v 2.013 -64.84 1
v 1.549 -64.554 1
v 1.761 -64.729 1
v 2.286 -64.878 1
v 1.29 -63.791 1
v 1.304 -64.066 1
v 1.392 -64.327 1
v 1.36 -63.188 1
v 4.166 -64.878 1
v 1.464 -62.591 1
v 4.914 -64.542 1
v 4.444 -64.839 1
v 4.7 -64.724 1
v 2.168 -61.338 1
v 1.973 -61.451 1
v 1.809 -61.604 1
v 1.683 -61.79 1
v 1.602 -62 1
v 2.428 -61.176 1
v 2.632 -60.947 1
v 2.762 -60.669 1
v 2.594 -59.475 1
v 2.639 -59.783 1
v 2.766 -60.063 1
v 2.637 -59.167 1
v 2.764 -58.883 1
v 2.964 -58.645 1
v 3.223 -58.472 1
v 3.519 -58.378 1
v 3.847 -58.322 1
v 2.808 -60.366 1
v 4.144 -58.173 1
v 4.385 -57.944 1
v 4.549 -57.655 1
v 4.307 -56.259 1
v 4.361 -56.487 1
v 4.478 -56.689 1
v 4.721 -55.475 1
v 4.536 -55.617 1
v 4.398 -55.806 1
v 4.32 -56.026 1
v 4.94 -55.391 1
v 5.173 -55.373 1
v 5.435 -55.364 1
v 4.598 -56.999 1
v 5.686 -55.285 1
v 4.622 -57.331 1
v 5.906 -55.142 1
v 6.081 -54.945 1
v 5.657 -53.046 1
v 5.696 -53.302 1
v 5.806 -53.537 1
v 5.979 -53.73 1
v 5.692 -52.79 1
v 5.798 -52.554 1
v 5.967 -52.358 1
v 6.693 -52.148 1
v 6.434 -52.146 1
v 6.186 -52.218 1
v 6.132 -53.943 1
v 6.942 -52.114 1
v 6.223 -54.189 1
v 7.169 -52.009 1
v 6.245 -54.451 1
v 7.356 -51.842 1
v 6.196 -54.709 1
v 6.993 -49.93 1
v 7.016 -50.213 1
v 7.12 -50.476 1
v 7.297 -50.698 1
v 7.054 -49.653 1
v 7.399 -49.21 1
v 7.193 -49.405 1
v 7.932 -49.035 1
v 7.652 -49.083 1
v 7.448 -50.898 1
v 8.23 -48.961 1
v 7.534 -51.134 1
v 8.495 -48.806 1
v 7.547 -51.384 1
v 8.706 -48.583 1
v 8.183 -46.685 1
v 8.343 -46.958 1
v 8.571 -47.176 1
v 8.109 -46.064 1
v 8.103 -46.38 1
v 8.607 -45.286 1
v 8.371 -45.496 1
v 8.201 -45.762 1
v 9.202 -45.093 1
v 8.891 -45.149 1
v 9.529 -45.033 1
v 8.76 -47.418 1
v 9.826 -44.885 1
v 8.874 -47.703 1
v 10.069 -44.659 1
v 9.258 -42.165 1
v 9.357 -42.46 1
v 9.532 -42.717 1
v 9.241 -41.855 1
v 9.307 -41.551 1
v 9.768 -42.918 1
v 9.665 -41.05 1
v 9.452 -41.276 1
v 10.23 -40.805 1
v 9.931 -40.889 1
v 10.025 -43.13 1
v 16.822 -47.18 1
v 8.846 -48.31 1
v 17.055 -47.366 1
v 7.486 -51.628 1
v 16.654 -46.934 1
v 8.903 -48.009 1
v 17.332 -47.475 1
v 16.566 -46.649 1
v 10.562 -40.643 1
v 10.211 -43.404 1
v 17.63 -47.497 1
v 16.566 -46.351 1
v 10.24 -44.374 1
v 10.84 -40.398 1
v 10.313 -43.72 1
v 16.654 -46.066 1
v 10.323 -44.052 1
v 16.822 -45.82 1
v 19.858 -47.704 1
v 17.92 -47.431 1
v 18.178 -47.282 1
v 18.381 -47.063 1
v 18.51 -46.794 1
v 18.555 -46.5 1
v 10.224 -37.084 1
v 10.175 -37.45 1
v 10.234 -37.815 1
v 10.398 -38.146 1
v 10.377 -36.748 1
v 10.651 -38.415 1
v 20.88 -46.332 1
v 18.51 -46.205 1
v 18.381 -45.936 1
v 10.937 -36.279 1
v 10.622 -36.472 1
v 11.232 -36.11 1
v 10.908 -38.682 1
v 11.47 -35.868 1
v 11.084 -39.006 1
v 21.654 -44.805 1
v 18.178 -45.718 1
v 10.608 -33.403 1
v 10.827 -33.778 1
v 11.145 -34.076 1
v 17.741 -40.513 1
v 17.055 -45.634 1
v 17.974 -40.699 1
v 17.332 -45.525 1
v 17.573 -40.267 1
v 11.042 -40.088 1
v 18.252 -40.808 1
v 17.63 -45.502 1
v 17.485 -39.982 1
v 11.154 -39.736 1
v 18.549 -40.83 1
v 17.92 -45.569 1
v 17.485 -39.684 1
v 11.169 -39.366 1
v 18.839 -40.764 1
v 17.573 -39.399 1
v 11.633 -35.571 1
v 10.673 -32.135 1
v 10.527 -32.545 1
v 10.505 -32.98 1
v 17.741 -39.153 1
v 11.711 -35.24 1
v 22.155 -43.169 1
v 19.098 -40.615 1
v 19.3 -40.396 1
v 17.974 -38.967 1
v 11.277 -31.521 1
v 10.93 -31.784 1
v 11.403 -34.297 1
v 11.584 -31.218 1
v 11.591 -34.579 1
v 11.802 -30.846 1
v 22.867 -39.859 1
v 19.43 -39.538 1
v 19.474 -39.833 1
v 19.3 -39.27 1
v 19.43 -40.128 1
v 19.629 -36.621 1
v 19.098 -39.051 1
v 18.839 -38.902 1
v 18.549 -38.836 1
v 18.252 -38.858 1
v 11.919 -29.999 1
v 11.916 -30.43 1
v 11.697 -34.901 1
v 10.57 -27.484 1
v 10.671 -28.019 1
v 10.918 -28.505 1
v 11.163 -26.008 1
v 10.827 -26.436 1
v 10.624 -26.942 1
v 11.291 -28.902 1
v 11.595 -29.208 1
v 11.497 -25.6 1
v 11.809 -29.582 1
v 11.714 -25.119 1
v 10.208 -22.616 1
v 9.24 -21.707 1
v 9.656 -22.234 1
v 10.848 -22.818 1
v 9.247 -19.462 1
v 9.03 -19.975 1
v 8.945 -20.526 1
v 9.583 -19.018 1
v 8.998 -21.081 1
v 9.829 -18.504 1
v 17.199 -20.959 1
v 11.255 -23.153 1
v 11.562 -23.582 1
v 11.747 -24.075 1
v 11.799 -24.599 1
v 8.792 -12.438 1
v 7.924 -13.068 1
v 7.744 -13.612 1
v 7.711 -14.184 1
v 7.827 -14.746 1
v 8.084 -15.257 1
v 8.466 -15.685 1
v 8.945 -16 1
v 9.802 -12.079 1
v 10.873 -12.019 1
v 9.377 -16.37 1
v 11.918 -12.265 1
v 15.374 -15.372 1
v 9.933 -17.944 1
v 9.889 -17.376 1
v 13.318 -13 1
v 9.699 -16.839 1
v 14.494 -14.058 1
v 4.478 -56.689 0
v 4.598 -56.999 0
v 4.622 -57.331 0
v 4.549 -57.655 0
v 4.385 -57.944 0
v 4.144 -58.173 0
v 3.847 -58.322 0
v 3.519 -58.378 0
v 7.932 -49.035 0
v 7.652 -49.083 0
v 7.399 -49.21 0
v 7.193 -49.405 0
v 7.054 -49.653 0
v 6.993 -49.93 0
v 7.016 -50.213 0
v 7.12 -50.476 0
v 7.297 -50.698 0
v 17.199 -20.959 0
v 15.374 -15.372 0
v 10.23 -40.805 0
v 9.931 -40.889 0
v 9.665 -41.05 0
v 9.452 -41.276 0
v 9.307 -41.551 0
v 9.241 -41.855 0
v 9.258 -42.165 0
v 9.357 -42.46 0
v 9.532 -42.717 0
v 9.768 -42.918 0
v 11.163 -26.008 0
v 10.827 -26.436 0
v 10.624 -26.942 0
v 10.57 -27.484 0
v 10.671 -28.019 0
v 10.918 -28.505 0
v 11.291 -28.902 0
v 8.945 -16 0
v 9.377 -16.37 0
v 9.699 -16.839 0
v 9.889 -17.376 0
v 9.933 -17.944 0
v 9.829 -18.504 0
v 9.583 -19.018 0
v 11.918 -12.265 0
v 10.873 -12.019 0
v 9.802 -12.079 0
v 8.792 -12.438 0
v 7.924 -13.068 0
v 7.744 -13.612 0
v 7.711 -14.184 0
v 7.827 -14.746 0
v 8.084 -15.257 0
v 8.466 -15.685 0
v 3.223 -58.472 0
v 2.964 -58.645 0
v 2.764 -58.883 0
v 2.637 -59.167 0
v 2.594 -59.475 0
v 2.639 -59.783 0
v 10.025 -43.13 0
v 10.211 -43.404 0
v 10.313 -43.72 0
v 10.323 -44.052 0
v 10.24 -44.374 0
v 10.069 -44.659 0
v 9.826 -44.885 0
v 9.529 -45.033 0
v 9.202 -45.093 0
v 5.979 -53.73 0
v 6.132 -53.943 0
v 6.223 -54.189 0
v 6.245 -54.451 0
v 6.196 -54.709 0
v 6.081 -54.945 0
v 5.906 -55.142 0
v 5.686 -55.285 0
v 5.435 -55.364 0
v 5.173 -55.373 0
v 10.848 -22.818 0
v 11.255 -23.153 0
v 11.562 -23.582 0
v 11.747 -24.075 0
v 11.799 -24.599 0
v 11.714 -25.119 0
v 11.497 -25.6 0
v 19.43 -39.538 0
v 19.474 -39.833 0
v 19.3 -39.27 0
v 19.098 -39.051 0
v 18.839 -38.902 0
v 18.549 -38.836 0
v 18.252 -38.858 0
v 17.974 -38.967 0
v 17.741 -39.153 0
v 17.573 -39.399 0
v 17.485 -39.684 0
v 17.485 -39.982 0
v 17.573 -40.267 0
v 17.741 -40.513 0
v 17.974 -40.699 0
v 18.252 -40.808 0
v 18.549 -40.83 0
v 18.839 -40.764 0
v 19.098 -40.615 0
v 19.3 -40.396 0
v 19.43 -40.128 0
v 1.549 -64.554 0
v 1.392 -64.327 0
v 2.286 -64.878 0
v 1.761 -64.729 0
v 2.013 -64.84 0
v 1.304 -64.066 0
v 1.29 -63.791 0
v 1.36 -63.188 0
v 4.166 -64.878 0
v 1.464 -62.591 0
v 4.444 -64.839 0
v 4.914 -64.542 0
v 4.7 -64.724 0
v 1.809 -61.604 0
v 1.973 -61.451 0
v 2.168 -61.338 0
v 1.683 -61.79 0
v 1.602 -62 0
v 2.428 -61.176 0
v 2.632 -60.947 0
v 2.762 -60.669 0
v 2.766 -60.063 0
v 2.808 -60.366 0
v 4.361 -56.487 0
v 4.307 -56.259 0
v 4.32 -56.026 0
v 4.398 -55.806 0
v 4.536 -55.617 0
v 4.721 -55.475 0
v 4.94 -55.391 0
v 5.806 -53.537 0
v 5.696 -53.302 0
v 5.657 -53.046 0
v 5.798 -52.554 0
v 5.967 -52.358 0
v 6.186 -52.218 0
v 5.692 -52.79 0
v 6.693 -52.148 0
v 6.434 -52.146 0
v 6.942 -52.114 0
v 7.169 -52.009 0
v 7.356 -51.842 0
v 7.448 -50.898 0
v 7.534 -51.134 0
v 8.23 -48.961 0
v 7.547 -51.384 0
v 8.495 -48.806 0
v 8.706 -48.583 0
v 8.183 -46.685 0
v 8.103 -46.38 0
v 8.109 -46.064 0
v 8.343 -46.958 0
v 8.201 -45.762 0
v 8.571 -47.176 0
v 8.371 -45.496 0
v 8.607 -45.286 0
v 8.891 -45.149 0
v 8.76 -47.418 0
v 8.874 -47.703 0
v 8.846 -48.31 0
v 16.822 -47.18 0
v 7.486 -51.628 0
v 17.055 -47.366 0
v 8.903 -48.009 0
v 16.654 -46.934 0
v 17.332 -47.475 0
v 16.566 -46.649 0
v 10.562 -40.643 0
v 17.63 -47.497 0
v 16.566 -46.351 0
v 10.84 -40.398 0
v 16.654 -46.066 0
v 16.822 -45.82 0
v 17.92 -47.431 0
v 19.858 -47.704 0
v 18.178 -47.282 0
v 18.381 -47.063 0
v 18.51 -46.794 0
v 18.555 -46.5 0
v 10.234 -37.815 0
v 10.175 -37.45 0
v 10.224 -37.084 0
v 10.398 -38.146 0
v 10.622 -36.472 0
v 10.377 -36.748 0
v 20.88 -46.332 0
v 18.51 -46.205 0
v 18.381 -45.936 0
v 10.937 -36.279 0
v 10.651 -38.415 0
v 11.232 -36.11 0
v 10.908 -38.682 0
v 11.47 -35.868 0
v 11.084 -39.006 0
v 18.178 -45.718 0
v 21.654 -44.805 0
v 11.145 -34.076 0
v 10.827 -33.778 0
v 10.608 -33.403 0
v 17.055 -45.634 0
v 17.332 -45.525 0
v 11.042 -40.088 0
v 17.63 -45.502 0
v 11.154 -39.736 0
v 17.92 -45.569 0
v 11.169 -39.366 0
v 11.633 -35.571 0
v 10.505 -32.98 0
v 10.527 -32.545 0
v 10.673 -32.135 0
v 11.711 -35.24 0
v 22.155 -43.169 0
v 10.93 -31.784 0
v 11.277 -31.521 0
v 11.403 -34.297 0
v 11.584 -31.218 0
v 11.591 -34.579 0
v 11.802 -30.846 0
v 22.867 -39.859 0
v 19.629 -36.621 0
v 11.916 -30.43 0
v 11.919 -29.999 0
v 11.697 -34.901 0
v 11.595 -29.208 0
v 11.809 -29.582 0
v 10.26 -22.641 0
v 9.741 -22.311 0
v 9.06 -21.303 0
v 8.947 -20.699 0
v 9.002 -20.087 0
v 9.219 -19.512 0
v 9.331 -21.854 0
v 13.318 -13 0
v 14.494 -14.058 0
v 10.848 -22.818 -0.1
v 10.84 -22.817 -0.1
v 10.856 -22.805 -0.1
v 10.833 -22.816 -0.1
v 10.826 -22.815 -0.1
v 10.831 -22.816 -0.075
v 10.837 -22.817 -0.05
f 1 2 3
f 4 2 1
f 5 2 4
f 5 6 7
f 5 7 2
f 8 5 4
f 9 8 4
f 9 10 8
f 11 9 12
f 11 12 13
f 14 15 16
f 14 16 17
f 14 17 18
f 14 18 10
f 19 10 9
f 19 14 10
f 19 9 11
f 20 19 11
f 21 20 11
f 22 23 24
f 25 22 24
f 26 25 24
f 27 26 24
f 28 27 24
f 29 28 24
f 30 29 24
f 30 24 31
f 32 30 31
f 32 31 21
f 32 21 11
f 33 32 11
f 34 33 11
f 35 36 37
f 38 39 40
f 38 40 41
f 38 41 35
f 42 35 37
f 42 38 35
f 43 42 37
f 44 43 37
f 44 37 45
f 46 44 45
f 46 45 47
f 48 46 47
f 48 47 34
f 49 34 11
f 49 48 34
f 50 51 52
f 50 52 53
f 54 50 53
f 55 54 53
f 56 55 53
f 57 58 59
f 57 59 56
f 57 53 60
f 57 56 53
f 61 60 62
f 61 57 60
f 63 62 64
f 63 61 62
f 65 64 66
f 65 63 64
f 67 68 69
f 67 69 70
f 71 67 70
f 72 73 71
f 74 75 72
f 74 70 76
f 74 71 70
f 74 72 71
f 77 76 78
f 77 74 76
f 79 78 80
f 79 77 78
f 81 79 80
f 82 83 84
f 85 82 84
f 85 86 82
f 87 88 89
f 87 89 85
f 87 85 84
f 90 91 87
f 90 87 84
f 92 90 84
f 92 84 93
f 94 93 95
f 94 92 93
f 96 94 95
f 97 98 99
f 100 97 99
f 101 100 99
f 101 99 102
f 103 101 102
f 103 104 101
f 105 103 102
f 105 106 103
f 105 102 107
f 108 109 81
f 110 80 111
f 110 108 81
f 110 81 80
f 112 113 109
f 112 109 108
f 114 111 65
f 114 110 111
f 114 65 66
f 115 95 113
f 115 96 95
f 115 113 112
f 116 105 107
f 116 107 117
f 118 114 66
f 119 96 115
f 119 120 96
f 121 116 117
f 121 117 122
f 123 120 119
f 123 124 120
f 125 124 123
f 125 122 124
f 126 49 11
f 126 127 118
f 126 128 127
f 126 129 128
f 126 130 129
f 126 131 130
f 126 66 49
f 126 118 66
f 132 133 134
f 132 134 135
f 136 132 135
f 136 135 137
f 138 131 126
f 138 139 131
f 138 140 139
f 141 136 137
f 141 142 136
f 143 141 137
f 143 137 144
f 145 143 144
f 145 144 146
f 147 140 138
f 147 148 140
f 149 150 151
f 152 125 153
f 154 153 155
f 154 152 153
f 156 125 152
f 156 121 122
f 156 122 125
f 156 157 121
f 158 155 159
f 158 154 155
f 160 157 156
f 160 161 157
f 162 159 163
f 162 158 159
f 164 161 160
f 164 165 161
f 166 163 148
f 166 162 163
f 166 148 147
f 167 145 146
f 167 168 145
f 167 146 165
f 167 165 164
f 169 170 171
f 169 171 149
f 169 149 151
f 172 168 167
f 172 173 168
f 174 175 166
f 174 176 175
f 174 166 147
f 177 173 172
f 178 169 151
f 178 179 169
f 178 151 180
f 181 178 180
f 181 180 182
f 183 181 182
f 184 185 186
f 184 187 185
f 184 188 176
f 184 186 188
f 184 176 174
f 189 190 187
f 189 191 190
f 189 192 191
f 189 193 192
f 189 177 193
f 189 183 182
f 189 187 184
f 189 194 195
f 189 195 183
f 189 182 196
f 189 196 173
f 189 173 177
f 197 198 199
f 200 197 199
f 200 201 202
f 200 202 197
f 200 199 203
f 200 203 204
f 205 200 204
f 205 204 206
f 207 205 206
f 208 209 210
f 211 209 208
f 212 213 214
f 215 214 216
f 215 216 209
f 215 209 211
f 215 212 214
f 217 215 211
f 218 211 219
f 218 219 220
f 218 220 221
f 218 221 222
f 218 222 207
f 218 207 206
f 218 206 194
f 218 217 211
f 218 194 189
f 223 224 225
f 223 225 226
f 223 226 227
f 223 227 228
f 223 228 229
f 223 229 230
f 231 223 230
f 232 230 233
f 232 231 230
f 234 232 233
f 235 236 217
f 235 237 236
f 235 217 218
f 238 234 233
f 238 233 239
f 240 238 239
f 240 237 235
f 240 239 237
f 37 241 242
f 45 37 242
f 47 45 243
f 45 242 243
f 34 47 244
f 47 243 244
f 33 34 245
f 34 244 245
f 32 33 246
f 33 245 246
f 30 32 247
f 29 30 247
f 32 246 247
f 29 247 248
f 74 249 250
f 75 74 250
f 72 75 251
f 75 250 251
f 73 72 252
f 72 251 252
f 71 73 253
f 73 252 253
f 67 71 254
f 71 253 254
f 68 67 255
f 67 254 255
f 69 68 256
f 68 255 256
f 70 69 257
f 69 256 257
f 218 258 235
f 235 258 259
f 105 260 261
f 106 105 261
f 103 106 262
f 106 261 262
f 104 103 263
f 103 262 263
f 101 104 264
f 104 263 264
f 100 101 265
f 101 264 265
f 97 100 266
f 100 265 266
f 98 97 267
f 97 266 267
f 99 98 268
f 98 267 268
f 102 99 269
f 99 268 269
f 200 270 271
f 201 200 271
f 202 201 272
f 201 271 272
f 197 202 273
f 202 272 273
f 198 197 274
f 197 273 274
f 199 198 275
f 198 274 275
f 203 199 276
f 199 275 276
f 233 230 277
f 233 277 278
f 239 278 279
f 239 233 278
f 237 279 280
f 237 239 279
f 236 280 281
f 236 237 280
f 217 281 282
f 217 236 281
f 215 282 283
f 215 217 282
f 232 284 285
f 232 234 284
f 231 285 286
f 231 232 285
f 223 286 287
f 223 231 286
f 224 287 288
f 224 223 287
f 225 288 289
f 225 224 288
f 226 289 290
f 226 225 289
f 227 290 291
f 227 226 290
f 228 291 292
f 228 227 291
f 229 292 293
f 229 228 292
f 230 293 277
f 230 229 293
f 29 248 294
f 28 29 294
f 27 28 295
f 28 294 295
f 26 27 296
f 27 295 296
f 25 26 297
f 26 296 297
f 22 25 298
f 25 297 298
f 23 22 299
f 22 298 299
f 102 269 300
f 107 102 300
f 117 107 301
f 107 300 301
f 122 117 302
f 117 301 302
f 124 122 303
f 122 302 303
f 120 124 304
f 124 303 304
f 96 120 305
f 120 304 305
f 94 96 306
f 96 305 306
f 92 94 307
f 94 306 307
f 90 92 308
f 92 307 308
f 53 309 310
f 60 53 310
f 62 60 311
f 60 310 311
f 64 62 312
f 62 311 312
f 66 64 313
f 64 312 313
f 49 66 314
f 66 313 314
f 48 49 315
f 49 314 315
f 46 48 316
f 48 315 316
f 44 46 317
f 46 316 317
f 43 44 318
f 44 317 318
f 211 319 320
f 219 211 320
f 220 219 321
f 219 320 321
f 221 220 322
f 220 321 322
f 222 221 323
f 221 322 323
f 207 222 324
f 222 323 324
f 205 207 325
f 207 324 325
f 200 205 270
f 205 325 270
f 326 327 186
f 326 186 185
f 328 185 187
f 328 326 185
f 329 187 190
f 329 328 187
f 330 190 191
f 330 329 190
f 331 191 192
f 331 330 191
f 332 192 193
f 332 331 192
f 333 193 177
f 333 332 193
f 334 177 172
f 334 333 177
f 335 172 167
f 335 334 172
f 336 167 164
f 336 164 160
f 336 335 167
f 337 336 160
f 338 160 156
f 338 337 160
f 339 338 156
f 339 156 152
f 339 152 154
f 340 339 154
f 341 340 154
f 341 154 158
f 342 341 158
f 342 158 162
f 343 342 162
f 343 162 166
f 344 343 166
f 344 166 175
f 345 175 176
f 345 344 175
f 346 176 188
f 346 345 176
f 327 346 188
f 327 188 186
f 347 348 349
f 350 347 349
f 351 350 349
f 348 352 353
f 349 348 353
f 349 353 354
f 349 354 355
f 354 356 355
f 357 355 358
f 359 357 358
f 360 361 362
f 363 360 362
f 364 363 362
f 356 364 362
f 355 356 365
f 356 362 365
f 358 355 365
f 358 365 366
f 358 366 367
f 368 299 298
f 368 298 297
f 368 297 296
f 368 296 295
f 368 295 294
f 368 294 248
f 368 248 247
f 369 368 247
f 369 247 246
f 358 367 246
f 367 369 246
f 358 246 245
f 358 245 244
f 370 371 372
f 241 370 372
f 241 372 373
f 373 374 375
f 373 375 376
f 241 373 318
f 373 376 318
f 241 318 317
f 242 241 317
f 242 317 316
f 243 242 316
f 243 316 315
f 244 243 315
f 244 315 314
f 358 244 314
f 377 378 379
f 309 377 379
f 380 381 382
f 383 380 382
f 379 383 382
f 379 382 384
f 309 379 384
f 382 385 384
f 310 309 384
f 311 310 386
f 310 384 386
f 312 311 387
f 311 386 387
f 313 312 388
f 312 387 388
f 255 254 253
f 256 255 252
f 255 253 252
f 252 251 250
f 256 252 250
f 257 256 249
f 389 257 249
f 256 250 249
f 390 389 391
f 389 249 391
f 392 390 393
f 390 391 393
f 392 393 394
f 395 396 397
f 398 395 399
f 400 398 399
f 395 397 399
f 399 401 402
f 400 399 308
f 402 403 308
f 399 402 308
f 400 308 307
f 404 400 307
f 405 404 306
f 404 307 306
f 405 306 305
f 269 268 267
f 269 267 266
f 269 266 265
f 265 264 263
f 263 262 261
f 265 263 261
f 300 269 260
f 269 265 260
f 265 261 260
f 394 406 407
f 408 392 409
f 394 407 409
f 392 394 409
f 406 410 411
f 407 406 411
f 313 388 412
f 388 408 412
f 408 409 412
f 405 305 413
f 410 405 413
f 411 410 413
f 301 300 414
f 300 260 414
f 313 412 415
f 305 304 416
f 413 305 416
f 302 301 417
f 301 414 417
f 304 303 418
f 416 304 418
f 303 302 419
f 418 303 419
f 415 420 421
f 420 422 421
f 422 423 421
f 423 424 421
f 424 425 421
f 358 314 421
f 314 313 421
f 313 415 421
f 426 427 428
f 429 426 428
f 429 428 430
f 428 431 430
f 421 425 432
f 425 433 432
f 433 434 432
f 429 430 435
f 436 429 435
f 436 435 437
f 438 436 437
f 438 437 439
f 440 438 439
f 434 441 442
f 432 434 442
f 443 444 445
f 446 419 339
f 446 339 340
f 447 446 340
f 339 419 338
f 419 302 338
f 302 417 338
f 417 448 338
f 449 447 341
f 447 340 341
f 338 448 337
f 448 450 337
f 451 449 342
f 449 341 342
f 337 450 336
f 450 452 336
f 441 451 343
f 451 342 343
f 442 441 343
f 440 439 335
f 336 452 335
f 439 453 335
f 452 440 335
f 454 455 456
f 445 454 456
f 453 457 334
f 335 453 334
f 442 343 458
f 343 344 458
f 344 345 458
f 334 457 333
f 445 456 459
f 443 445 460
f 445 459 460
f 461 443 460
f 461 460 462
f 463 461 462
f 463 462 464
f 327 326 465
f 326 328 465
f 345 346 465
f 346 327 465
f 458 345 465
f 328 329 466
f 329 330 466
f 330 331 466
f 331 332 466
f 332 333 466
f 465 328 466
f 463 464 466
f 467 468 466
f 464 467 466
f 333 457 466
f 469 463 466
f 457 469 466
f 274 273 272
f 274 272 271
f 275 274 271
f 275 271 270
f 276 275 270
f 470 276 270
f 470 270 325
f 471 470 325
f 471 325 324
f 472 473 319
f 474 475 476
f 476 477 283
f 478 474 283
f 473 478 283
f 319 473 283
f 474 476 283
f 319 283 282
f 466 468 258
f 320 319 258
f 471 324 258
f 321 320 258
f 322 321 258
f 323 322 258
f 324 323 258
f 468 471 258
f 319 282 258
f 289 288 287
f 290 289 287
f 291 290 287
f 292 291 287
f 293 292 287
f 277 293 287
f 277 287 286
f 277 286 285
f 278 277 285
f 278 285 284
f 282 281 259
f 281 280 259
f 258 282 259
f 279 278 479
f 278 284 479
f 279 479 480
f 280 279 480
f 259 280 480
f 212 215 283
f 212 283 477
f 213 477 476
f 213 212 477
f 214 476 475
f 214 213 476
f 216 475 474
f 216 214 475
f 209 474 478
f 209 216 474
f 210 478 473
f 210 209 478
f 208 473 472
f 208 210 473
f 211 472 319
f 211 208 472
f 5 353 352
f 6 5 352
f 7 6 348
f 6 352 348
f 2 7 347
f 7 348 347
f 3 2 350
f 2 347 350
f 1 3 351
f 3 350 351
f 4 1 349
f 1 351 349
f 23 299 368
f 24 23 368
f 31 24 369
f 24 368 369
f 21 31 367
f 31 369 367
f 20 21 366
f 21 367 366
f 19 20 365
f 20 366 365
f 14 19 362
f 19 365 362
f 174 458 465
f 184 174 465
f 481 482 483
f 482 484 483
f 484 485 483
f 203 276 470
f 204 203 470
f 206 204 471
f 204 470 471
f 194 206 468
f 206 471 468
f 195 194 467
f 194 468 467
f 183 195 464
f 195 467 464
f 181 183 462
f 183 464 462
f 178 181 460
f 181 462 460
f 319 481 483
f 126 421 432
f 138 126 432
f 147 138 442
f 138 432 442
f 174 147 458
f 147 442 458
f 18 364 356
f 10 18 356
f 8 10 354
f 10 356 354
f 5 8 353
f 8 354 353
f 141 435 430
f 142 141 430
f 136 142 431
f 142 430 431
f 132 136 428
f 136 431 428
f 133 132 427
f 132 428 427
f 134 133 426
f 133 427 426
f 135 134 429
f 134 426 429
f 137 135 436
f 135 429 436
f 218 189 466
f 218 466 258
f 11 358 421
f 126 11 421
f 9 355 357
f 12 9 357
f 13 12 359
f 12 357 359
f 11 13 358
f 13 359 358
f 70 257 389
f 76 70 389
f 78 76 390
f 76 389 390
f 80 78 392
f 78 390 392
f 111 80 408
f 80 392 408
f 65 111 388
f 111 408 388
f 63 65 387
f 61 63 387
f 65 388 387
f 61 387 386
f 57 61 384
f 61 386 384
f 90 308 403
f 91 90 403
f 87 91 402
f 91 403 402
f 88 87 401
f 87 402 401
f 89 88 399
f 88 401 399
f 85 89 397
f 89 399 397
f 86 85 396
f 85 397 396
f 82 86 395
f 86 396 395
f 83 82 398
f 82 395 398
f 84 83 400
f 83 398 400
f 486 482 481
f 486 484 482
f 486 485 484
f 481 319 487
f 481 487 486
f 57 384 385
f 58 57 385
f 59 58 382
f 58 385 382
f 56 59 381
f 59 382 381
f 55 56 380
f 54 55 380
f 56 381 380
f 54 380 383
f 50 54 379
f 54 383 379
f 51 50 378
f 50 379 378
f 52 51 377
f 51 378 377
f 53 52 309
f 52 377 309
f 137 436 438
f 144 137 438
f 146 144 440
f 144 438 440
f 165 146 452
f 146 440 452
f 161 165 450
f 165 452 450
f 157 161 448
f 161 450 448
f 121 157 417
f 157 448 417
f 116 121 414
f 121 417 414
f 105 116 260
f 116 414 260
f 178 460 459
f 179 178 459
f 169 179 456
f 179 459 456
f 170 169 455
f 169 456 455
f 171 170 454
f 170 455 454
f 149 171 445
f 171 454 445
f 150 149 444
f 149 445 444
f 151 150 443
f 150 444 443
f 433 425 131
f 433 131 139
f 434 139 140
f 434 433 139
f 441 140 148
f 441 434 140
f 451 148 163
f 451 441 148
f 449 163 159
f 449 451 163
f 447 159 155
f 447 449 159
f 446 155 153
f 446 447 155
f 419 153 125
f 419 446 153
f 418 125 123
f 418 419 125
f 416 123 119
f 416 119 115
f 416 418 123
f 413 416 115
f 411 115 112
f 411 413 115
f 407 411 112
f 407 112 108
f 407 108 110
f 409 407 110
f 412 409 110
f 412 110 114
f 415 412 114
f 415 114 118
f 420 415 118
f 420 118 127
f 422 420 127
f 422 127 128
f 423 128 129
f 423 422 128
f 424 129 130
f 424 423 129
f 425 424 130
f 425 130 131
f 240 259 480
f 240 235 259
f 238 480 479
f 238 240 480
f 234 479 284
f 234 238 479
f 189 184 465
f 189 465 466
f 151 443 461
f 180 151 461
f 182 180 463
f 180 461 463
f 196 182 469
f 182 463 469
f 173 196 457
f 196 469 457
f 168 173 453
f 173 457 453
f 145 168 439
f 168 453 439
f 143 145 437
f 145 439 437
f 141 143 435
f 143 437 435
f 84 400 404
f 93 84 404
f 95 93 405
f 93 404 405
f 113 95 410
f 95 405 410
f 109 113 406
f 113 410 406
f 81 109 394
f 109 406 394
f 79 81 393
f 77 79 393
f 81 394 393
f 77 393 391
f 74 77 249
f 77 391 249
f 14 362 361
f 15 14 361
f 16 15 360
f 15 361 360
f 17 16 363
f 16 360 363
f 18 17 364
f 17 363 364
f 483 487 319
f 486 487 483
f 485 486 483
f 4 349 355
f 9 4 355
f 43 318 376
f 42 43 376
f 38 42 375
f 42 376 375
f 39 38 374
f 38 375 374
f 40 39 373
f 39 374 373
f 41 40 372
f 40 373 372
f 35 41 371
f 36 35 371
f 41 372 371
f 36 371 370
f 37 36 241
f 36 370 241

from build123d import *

# Parameters (mm, degrees)
SKETCH1_R               = 1
SKETCH1_R_2             = 2.25
SKETCH1_R_3             = 0.998074624
BOSS_EXTRUDE2_DEPTH     = 1
CUT_EXTRUDE1_DEPTH      = 70.647946454
CUT_EXTRUDE1_DEPTH_BACK = 70.647946454
BOSS_EXTRUDE3_START     = -1
SKETCH3_R               = 0.998074624
BOSS_EXTRUDE3_DEPTH     = 1
BOSS_EXTRUDE4_DEPTH     = 1.1
CUT_EXTRUDE2_DEPTH      = 69.864267842
CUT_EXTRUDE2_DEPTH_BACK = 69.864267842
CUT_EXTRUDE3_DEPTH      = 70.310849907
CUT_EXTRUDE3_DEPTH_BACK = 70.310849907
CUT_EXTRUDE4_DEPTH      = 69.864267842
CUT_EXTRUDE4_DEPTH_BACK = 69.864267842


with BuildPart() as part:
    # Sketch1 → Boss-Extrude2 (new body)
    with BuildSketch(Plane.XY):
        with BuildLine():
            Line((5.146977147, -5.612602955), (7.44171219, -13.199988708))
            ThreePointArc((7.44171219, -13.199988708), (7.439945119, -13.784749424), (7.111476001, -14.268543034))
            ThreePointArc((7.111476001, -14.268543034), (5.923924572, -18.62818009), (9.697794763, -21.113057841))
            ThreePointArc((9.697794763, -21.113057841), (10.380528535, -21.341854349), (10.732574986, -21.969975788))
            ThreePointArc((10.732574986, -21.969975788), (10.791766979, -22.393908793), (10.847713449, -22.818282305))
            ThreePointArc((10.847713449, -22.818282305), (11.790244876, -24.335347863), (11.16321594, -26.007678007))
            ThreePointArc((11.16321594, -26.007678007), (10.570290463, -27.483765064), (11.290805177, -28.901951288))
            ThreePointArc((11.290805177, -28.901951288), (11.931562756, -30.214937196), (11.277042334, -31.52111685))
            ThreePointArc((11.277042334, -31.52111685), (10.500432467, -32.761716535), (11.145287395, -34.075631519))
            ThreePointArc((11.145287395, -34.075631519), (11.711049486, -35.240414102), (10.937199745, -36.278663489))
            ThreePointArc((10.937199745, -36.278663489), (10.185540032, -37.265502357), (10.650830557, -38.415436269))
            ThreePointArc((10.650830557, -38.415436269), (11.153884573, -39.735845823), (10.230304321, -40.805212107))
            ThreePointArc((10.230304321, -40.805212107), (9.263580844, -41.700908083), (9.768401259, -42.918274877))
            ThreePointArc((9.768401259, -42.918274877), (10.29278617, -44.215864041), (9.202326649, -45.093141196))
            ThreePointArc((9.202326649, -45.093141196), (8.144843355, -45.909982105), (8.571180325, -47.176369398))
            ThreePointArc((8.571180325, -47.176369398), (8.845608938, -48.309992252), (7.932024848, -49.035096348))
            ThreePointArc((7.932024848, -49.035096348), (7.054134874, -49.652663659), (7.297145805, -50.698142438))
            ThreePointArc((7.297145805, -50.698142438), (7.486031135, -51.627523472), (6.693279806, -52.148073283))
            ThreePointArc((6.693279806, -52.148073283), (5.736341709, -52.667939714), (5.979078831, -53.729575393))
            ThreePointArc((5.979078831, -53.729575393), (6.146574337, -54.831276595), (5.172832259, -55.373149872))
            ThreePointArc((5.172832259, -55.373149872), (4.397991341, -55.805643097), (4.477975588, -56.689402883))
            ThreePointArc((4.477975588, -56.689402883), (4.477842946, -57.805544451), (3.519463877, -58.377629741))
            ThreePointArc((3.519463877, -58.377629741), (2.763689302, -58.882818754), (2.639049746, -59.78330536))
            ThreePointArc((2.639049746, -59.78330536), (2.762025793, -60.669472955), (2.167842085, -61.338324084))
            ThreePointArc((2.167842085, -61.338324084), (1.808869059, -61.604258533), (1.601521968, -61.999973009))
            ThreePointArc((1.601521968, -61.999973009), (1.407536389, -62.888842845), (1.289722883, -63.790973638))
            ThreePointArc((1.289722883, -63.790973638), (1.548602642, -64.553775113), (2.285909866, -64.878217524))
            Line((2.285909866, -64.878217524), (4.16607409, -64.878217524))
            ThreePointArc((4.16607409, -64.878217524), (4.576078061, -64.790301261), (4.913989999, -64.54201101))
            Line((4.913989999, -64.54201101), (19.858030846, -47.704114694))
            ThreePointArc((19.858030846, -47.704114694), (21.299586827, -45.585122466), (22.155211357, -43.169316519))
            Line((22.155211357, -43.169316519), (25.087470282, -29.538838187))
            ThreePointArc((25.087470282, -29.538838187), (25.281255234, -26.663292069), (24.646889926, -23.851904734))
            Line((24.646889926, -23.851904734), (16.800568019, -3.412304746))
            ThreePointArc((16.800568019, -3.412304746), (16.953922391, -3.093842948), (17.092102067, -2.768509492))
            Line((17.092102067, -2.768509492), (18.529571691, -3.317185246))
            ThreePointArc((18.529571691, -3.317185246), (19.942904756, -2.448680804), (19.102743866, -1.018317214))
            Line((19.102743866, -1.018317214), (17.575945858, -0.827918039))
            ThreePointArc((17.575945858, -0.827918039), (17.62064019, 0.130893048), (17.54251106, 1.087560245))
            Line((17.54251106, 1.087560245), (19.061734148, 1.331127915))
            ThreePointArc((19.061734148, 1.331127915), (19.851464266, 2.789941358), (18.408681797, 3.608592118))
            Line((18.408681797, 3.608592118), (16.991236349, 3.010083636))
            ThreePointArc((16.991236349, 3.010083636), (16.550537232, 3.862785562), (16.004541822, 4.652219092))
            Line((16.004541822, 4.652219092), (17.198443775, 5.622766426))
            ThreePointArc((17.198443775, 5.622766426), (17.152963398, 7.281000986), (15.494151748, 7.268582106))
            Line((15.494151748, 7.268582106), (14.565862222, 6.041535833))
            ThreePointArc((14.565862222, 6.041535833), (13.757854628, 6.559647804), (12.890291968, 6.97031959))
            Line((12.890291968, 6.97031959), (13.438967722, 8.407789214))
            ThreePointArc((13.438967722, 8.407789214), (12.57046328, 9.821122279), (11.140099691, 8.980961389))
            Line((11.140099691, 8.980961389), (10.949700516, 7.454163382))
            ThreePointArc((10.949700516, 7.454163382), (9.990889428, 7.498857714), (9.034222232, 7.420728584))
            Line((9.034222232, 7.420728584), (8.790654561, 8.939951672))
            ThreePointArc((8.790654561, 8.939951672), (7.331841118, 9.729681789), (6.513190359, 8.286899321))
            Line((6.513190359, 8.286899321), (7.11169884, 6.869453872))
            ThreePointArc((7.11169884, 6.869453872), (6.258996915, 6.428754755), (5.469563385, 5.882759346))
            Line((5.469563385, 5.882759346), (4.49901605, 7.076661299))
            ThreePointArc((4.49901605, 7.076661299), (2.840781491, 7.031180921), (2.85320037, 5.372369271))
            Line((2.85320037, 5.372369271), (4.080246644, 4.444079745))
            ThreePointArc((4.080246644, 4.444079745), (3.562134673, 3.636072152), (3.151462886, 2.768509492))
            Line((3.151462886, 2.768509492), (1.713993262, 3.317185246))
            ThreePointArc((1.713993262, 3.317185246), (0.300660197, 2.448680804), (1.140821087, 1.018317214))
            Line((1.140821087, 1.018317214), (2.667619095, 0.827918039))
            ThreePointArc((2.667619095, 0.827918039), (2.622924763, -0.130893048), (2.701053893, -1.087560245))
            Line((2.701053893, -1.087560245), (1.181830804, -1.331127915))
            ThreePointArc((1.181830804, -1.331127915), (0.392100687, -2.789941358), (1.834883156, -3.608592118))
            Line((1.834883156, -3.608592118), (3.252328604, -3.010083636))
            ThreePointArc((3.252328604, -3.010083636), (4.058376197, -4.414193504), (5.146977147, -5.612602955))
        make_face()
        with Locations((10.121782476, 0)):
            Circle(SKETCH1_R, mode=Mode.SUBTRACT)
        with Locations((15.627966379, -9.260281964)):
            Circle(SKETCH1_R_2, mode=Mode.SUBTRACT)
        with Locations((9.121782476, -17.526259213)):
            Circle(SKETCH1_R_3, mode=Mode.SUBTRACT)
        with Locations((22.60685911, -26.49969455)):
            Circle(SKETCH1_R, mode=Mode.SUBTRACT)
        with Locations((22.60685911, -33.166361217)):
            Circle(SKETCH1_R, mode=Mode.SUBTRACT)
        with Locations((18.474150388, -39.833027883)):
            Circle(SKETCH1_R, mode=Mode.SUBTRACT)
        with Locations((17.55481685, -46.49969455)):
            Circle(SKETCH1_R, mode=Mode.SUBTRACT)
        with BuildLine():
            Line((14.500290742, -21.375988683), (12.638736062, -16.487053928))
            ThreePointArc((12.638736062, -16.487053928), (13.337027802, -14.929994394), (14.894087335, -15.628286133))
            Line((14.894087335, -15.628286133), (16.755642015, -20.517220889))
            ThreePointArc((16.755642015, -20.517220889), (16.057350276, -22.074280422), (14.500290742, -21.375988683))
        make_face(mode=Mode.SUBTRACT)
    extrude(amount=BOSS_EXTRUDE2_DEPTH)

    # Sketch2 → Cut-Extrude1 (cut, two sides: drawn at the far end of the back side and taken through both)
    with BuildSketch(Plane.XY.offset(1).offset(-CUT_EXTRUDE1_DEPTH_BACK)):
        Polygon((23.067385557, -38.929114347), (13.377966379, -9.260281964), (6.294344668, -9.406295831), (-11.974505851, 6.419078926), (6.294344668, 12.782954548), (25.940890827, 9.601016737), (30.043126859, -7.362530315), (32.828926707, -29.92513595), align=None)
    extrude(amount=CUT_EXTRUDE1_DEPTH + CUT_EXTRUDE1_DEPTH_BACK, mode=Mode.SUBTRACT)

    # Sketch3 → Boss-Extrude3 (add)
    with BuildSketch(Plane.XY.offset(1).offset(BOSS_EXTRUDE3_START)):
        with Locations((9.121782476, -17.526259213)):
            Circle(SKETCH3_R)
        with BuildLine():
            Line((16.755642015, -20.517220889), (14.894087335, -15.628286133))
            ThreePointArc((14.894087335, -15.628286133), (13.337027802, -14.929994394), (12.638736062, -16.487053928))
            Line((12.638736062, -16.487053928), (14.500290742, -21.375988683))
            ThreePointArc((14.500290742, -21.375988683), (16.057350276, -22.074280422), (16.755642015, -20.517220889))
        make_face()
    extrude(amount=BOSS_EXTRUDE3_DEPTH)

    # Sketch4 → Boss-Extrude4 (add)
    with BuildSketch(Plane.XY.offset(1)):
        with BuildLine():
            Line((10.847713449, -22.818282305), (15.374031166, -15.372197501))
            ThreePointArc((15.374031166, -15.372197501), (13.938899809, -13.492496557), (11.917619823, -12.264773107))
            ThreePointArc((11.917619823, -12.264773107), (9.802354219, -12.078974443), (7.923567461, -13.068433908))
            ThreePointArc((7.923567461, -13.068433908), (7.826972113, -14.745507843), (8.944539239, -15.99968142))
            ThreePointArc((8.944539239, -15.99968142), (9.889006411, -17.376441406), (9.583329231, -19.017796869))
            ThreePointArc((9.583329231, -19.017796869), (9.059868552, -21.302513931), (10.847713449, -22.818282305))
        make_face()
    extrude(amount=-BOSS_EXTRUDE4_DEPTH)

    # Sketch5 → Cut-Extrude2 (cut, two sides: drawn at the far end of the back side and taken through both)
    with BuildSketch(Plane(origin=(0, 0, 0), x_dir=(-1, 0, 0), z_dir=(0, 0, -1)).offset(-CUT_EXTRUDE2_DEPTH_BACK)):
        with BuildLine():
            Line((-7.44171219, -13.199988708), (-6.294344668, -9.406295831))
            Line((-6.294344668, -9.406295831), (-13.377966379, -9.260281964))
            ThreePointArc((-13.377966379, -9.260281964), (-13.489138929, -9.958792624), (-13.811670505, -10.58827643))
            Line((-13.811670505, -10.58827643), (-15.374031166, -15.372197501))
            ThreePointArc((-15.374031166, -15.372197501), (-13.938899809, -13.492496557), (-11.917619823, -12.264773107))
            ThreePointArc((-11.917619823, -12.264773107), (-9.802354219, -12.078974443), (-7.923567461, -13.068433908))
            ThreePointArc((-7.923567461, -13.068433908), (-7.826972113, -14.745507843), (-8.944539239, -15.99968142))
            ThreePointArc((-8.944539239, -15.99968142), (-9.889006411, -17.376441406), (-9.583329231, -19.017796869))
            ThreePointArc((-9.583329231, -19.017796869), (-9.030056336, -19.975340702), (-8.998468155, -21.080783272))
            ThreePointArc((-8.998468155, -21.080783272), (-5.815114314, -18.295104282), (-7.111476001, -14.268543034))
            ThreePointArc((-7.111476001, -14.268543034), (-7.439945119, -13.784749424), (-7.44171219, -13.199988708))
        make_face()
    extrude(amount=CUT_EXTRUDE2_DEPTH + CUT_EXTRUDE2_DEPTH_BACK, mode=Mode.SUBTRACT)

    # Sketch6 → Cut-Extrude3 (cut, two sides: drawn at the far end of the back side and taken through both)
    with BuildSketch(Plane(origin=(9.355814727, 3.05547618, 0), x_dir=(0, 0, -1), z_dir=(0.9505899773939267, 0.31044918244088504, 0)).offset(-CUT_EXTRUDE3_DEPTH_BACK)):
        Polygon((0, -25.058494232), (0.374252859, -25.020494707), (2.926516303, -10.696178036), (0, -13.49636007), align=None)
    extrude(amount=CUT_EXTRUDE3_DEPTH + CUT_EXTRUDE3_DEPTH_BACK, mode=Mode.SUBTRACT)


with BuildPart() as cut_extrude3_piece_1:
    # of the separate pieces the step leaves, piece 1, a body of its own (cut_extrude3_pieces)
    add(part.part.solids().sort_by_distance((4.913989999, -64.54201101, 0))[0])

    # Sketch7 → Cut-Extrude4 (cut, two sides: drawn at the far end of the back side and taken through both)
    with BuildSketch(Plane(origin=(0, 0, 0), x_dir=(-1, 0, 0), z_dir=(0, 0, -1)).offset(-CUT_EXTRUDE4_DEPTH_BACK)):
        Polygon((-22.867386931, -39.858799279), (-19.629269045, -36.620681393), (-17.198561033, -20.958876105), (-20.466436133, -20.958876105), (-26.545979071, -37.447389214), align=None)
    extrude(amount=CUT_EXTRUDE4_DEPTH + CUT_EXTRUDE4_DEPTH_BACK, mode=Mode.SUBTRACT)


with BuildPart() as cut_extrude3_piece_2:
    # of the separate pieces the step leaves, piece 2, a body of its own (cut_extrude3_pieces)
    add(part.part.solids().sort_by_distance((10.855814599, -22.80495539, -0.1))[0])


solid = Compound([cut_extrude3_piece_1.part, cut_extrude3_piece_2.part])
